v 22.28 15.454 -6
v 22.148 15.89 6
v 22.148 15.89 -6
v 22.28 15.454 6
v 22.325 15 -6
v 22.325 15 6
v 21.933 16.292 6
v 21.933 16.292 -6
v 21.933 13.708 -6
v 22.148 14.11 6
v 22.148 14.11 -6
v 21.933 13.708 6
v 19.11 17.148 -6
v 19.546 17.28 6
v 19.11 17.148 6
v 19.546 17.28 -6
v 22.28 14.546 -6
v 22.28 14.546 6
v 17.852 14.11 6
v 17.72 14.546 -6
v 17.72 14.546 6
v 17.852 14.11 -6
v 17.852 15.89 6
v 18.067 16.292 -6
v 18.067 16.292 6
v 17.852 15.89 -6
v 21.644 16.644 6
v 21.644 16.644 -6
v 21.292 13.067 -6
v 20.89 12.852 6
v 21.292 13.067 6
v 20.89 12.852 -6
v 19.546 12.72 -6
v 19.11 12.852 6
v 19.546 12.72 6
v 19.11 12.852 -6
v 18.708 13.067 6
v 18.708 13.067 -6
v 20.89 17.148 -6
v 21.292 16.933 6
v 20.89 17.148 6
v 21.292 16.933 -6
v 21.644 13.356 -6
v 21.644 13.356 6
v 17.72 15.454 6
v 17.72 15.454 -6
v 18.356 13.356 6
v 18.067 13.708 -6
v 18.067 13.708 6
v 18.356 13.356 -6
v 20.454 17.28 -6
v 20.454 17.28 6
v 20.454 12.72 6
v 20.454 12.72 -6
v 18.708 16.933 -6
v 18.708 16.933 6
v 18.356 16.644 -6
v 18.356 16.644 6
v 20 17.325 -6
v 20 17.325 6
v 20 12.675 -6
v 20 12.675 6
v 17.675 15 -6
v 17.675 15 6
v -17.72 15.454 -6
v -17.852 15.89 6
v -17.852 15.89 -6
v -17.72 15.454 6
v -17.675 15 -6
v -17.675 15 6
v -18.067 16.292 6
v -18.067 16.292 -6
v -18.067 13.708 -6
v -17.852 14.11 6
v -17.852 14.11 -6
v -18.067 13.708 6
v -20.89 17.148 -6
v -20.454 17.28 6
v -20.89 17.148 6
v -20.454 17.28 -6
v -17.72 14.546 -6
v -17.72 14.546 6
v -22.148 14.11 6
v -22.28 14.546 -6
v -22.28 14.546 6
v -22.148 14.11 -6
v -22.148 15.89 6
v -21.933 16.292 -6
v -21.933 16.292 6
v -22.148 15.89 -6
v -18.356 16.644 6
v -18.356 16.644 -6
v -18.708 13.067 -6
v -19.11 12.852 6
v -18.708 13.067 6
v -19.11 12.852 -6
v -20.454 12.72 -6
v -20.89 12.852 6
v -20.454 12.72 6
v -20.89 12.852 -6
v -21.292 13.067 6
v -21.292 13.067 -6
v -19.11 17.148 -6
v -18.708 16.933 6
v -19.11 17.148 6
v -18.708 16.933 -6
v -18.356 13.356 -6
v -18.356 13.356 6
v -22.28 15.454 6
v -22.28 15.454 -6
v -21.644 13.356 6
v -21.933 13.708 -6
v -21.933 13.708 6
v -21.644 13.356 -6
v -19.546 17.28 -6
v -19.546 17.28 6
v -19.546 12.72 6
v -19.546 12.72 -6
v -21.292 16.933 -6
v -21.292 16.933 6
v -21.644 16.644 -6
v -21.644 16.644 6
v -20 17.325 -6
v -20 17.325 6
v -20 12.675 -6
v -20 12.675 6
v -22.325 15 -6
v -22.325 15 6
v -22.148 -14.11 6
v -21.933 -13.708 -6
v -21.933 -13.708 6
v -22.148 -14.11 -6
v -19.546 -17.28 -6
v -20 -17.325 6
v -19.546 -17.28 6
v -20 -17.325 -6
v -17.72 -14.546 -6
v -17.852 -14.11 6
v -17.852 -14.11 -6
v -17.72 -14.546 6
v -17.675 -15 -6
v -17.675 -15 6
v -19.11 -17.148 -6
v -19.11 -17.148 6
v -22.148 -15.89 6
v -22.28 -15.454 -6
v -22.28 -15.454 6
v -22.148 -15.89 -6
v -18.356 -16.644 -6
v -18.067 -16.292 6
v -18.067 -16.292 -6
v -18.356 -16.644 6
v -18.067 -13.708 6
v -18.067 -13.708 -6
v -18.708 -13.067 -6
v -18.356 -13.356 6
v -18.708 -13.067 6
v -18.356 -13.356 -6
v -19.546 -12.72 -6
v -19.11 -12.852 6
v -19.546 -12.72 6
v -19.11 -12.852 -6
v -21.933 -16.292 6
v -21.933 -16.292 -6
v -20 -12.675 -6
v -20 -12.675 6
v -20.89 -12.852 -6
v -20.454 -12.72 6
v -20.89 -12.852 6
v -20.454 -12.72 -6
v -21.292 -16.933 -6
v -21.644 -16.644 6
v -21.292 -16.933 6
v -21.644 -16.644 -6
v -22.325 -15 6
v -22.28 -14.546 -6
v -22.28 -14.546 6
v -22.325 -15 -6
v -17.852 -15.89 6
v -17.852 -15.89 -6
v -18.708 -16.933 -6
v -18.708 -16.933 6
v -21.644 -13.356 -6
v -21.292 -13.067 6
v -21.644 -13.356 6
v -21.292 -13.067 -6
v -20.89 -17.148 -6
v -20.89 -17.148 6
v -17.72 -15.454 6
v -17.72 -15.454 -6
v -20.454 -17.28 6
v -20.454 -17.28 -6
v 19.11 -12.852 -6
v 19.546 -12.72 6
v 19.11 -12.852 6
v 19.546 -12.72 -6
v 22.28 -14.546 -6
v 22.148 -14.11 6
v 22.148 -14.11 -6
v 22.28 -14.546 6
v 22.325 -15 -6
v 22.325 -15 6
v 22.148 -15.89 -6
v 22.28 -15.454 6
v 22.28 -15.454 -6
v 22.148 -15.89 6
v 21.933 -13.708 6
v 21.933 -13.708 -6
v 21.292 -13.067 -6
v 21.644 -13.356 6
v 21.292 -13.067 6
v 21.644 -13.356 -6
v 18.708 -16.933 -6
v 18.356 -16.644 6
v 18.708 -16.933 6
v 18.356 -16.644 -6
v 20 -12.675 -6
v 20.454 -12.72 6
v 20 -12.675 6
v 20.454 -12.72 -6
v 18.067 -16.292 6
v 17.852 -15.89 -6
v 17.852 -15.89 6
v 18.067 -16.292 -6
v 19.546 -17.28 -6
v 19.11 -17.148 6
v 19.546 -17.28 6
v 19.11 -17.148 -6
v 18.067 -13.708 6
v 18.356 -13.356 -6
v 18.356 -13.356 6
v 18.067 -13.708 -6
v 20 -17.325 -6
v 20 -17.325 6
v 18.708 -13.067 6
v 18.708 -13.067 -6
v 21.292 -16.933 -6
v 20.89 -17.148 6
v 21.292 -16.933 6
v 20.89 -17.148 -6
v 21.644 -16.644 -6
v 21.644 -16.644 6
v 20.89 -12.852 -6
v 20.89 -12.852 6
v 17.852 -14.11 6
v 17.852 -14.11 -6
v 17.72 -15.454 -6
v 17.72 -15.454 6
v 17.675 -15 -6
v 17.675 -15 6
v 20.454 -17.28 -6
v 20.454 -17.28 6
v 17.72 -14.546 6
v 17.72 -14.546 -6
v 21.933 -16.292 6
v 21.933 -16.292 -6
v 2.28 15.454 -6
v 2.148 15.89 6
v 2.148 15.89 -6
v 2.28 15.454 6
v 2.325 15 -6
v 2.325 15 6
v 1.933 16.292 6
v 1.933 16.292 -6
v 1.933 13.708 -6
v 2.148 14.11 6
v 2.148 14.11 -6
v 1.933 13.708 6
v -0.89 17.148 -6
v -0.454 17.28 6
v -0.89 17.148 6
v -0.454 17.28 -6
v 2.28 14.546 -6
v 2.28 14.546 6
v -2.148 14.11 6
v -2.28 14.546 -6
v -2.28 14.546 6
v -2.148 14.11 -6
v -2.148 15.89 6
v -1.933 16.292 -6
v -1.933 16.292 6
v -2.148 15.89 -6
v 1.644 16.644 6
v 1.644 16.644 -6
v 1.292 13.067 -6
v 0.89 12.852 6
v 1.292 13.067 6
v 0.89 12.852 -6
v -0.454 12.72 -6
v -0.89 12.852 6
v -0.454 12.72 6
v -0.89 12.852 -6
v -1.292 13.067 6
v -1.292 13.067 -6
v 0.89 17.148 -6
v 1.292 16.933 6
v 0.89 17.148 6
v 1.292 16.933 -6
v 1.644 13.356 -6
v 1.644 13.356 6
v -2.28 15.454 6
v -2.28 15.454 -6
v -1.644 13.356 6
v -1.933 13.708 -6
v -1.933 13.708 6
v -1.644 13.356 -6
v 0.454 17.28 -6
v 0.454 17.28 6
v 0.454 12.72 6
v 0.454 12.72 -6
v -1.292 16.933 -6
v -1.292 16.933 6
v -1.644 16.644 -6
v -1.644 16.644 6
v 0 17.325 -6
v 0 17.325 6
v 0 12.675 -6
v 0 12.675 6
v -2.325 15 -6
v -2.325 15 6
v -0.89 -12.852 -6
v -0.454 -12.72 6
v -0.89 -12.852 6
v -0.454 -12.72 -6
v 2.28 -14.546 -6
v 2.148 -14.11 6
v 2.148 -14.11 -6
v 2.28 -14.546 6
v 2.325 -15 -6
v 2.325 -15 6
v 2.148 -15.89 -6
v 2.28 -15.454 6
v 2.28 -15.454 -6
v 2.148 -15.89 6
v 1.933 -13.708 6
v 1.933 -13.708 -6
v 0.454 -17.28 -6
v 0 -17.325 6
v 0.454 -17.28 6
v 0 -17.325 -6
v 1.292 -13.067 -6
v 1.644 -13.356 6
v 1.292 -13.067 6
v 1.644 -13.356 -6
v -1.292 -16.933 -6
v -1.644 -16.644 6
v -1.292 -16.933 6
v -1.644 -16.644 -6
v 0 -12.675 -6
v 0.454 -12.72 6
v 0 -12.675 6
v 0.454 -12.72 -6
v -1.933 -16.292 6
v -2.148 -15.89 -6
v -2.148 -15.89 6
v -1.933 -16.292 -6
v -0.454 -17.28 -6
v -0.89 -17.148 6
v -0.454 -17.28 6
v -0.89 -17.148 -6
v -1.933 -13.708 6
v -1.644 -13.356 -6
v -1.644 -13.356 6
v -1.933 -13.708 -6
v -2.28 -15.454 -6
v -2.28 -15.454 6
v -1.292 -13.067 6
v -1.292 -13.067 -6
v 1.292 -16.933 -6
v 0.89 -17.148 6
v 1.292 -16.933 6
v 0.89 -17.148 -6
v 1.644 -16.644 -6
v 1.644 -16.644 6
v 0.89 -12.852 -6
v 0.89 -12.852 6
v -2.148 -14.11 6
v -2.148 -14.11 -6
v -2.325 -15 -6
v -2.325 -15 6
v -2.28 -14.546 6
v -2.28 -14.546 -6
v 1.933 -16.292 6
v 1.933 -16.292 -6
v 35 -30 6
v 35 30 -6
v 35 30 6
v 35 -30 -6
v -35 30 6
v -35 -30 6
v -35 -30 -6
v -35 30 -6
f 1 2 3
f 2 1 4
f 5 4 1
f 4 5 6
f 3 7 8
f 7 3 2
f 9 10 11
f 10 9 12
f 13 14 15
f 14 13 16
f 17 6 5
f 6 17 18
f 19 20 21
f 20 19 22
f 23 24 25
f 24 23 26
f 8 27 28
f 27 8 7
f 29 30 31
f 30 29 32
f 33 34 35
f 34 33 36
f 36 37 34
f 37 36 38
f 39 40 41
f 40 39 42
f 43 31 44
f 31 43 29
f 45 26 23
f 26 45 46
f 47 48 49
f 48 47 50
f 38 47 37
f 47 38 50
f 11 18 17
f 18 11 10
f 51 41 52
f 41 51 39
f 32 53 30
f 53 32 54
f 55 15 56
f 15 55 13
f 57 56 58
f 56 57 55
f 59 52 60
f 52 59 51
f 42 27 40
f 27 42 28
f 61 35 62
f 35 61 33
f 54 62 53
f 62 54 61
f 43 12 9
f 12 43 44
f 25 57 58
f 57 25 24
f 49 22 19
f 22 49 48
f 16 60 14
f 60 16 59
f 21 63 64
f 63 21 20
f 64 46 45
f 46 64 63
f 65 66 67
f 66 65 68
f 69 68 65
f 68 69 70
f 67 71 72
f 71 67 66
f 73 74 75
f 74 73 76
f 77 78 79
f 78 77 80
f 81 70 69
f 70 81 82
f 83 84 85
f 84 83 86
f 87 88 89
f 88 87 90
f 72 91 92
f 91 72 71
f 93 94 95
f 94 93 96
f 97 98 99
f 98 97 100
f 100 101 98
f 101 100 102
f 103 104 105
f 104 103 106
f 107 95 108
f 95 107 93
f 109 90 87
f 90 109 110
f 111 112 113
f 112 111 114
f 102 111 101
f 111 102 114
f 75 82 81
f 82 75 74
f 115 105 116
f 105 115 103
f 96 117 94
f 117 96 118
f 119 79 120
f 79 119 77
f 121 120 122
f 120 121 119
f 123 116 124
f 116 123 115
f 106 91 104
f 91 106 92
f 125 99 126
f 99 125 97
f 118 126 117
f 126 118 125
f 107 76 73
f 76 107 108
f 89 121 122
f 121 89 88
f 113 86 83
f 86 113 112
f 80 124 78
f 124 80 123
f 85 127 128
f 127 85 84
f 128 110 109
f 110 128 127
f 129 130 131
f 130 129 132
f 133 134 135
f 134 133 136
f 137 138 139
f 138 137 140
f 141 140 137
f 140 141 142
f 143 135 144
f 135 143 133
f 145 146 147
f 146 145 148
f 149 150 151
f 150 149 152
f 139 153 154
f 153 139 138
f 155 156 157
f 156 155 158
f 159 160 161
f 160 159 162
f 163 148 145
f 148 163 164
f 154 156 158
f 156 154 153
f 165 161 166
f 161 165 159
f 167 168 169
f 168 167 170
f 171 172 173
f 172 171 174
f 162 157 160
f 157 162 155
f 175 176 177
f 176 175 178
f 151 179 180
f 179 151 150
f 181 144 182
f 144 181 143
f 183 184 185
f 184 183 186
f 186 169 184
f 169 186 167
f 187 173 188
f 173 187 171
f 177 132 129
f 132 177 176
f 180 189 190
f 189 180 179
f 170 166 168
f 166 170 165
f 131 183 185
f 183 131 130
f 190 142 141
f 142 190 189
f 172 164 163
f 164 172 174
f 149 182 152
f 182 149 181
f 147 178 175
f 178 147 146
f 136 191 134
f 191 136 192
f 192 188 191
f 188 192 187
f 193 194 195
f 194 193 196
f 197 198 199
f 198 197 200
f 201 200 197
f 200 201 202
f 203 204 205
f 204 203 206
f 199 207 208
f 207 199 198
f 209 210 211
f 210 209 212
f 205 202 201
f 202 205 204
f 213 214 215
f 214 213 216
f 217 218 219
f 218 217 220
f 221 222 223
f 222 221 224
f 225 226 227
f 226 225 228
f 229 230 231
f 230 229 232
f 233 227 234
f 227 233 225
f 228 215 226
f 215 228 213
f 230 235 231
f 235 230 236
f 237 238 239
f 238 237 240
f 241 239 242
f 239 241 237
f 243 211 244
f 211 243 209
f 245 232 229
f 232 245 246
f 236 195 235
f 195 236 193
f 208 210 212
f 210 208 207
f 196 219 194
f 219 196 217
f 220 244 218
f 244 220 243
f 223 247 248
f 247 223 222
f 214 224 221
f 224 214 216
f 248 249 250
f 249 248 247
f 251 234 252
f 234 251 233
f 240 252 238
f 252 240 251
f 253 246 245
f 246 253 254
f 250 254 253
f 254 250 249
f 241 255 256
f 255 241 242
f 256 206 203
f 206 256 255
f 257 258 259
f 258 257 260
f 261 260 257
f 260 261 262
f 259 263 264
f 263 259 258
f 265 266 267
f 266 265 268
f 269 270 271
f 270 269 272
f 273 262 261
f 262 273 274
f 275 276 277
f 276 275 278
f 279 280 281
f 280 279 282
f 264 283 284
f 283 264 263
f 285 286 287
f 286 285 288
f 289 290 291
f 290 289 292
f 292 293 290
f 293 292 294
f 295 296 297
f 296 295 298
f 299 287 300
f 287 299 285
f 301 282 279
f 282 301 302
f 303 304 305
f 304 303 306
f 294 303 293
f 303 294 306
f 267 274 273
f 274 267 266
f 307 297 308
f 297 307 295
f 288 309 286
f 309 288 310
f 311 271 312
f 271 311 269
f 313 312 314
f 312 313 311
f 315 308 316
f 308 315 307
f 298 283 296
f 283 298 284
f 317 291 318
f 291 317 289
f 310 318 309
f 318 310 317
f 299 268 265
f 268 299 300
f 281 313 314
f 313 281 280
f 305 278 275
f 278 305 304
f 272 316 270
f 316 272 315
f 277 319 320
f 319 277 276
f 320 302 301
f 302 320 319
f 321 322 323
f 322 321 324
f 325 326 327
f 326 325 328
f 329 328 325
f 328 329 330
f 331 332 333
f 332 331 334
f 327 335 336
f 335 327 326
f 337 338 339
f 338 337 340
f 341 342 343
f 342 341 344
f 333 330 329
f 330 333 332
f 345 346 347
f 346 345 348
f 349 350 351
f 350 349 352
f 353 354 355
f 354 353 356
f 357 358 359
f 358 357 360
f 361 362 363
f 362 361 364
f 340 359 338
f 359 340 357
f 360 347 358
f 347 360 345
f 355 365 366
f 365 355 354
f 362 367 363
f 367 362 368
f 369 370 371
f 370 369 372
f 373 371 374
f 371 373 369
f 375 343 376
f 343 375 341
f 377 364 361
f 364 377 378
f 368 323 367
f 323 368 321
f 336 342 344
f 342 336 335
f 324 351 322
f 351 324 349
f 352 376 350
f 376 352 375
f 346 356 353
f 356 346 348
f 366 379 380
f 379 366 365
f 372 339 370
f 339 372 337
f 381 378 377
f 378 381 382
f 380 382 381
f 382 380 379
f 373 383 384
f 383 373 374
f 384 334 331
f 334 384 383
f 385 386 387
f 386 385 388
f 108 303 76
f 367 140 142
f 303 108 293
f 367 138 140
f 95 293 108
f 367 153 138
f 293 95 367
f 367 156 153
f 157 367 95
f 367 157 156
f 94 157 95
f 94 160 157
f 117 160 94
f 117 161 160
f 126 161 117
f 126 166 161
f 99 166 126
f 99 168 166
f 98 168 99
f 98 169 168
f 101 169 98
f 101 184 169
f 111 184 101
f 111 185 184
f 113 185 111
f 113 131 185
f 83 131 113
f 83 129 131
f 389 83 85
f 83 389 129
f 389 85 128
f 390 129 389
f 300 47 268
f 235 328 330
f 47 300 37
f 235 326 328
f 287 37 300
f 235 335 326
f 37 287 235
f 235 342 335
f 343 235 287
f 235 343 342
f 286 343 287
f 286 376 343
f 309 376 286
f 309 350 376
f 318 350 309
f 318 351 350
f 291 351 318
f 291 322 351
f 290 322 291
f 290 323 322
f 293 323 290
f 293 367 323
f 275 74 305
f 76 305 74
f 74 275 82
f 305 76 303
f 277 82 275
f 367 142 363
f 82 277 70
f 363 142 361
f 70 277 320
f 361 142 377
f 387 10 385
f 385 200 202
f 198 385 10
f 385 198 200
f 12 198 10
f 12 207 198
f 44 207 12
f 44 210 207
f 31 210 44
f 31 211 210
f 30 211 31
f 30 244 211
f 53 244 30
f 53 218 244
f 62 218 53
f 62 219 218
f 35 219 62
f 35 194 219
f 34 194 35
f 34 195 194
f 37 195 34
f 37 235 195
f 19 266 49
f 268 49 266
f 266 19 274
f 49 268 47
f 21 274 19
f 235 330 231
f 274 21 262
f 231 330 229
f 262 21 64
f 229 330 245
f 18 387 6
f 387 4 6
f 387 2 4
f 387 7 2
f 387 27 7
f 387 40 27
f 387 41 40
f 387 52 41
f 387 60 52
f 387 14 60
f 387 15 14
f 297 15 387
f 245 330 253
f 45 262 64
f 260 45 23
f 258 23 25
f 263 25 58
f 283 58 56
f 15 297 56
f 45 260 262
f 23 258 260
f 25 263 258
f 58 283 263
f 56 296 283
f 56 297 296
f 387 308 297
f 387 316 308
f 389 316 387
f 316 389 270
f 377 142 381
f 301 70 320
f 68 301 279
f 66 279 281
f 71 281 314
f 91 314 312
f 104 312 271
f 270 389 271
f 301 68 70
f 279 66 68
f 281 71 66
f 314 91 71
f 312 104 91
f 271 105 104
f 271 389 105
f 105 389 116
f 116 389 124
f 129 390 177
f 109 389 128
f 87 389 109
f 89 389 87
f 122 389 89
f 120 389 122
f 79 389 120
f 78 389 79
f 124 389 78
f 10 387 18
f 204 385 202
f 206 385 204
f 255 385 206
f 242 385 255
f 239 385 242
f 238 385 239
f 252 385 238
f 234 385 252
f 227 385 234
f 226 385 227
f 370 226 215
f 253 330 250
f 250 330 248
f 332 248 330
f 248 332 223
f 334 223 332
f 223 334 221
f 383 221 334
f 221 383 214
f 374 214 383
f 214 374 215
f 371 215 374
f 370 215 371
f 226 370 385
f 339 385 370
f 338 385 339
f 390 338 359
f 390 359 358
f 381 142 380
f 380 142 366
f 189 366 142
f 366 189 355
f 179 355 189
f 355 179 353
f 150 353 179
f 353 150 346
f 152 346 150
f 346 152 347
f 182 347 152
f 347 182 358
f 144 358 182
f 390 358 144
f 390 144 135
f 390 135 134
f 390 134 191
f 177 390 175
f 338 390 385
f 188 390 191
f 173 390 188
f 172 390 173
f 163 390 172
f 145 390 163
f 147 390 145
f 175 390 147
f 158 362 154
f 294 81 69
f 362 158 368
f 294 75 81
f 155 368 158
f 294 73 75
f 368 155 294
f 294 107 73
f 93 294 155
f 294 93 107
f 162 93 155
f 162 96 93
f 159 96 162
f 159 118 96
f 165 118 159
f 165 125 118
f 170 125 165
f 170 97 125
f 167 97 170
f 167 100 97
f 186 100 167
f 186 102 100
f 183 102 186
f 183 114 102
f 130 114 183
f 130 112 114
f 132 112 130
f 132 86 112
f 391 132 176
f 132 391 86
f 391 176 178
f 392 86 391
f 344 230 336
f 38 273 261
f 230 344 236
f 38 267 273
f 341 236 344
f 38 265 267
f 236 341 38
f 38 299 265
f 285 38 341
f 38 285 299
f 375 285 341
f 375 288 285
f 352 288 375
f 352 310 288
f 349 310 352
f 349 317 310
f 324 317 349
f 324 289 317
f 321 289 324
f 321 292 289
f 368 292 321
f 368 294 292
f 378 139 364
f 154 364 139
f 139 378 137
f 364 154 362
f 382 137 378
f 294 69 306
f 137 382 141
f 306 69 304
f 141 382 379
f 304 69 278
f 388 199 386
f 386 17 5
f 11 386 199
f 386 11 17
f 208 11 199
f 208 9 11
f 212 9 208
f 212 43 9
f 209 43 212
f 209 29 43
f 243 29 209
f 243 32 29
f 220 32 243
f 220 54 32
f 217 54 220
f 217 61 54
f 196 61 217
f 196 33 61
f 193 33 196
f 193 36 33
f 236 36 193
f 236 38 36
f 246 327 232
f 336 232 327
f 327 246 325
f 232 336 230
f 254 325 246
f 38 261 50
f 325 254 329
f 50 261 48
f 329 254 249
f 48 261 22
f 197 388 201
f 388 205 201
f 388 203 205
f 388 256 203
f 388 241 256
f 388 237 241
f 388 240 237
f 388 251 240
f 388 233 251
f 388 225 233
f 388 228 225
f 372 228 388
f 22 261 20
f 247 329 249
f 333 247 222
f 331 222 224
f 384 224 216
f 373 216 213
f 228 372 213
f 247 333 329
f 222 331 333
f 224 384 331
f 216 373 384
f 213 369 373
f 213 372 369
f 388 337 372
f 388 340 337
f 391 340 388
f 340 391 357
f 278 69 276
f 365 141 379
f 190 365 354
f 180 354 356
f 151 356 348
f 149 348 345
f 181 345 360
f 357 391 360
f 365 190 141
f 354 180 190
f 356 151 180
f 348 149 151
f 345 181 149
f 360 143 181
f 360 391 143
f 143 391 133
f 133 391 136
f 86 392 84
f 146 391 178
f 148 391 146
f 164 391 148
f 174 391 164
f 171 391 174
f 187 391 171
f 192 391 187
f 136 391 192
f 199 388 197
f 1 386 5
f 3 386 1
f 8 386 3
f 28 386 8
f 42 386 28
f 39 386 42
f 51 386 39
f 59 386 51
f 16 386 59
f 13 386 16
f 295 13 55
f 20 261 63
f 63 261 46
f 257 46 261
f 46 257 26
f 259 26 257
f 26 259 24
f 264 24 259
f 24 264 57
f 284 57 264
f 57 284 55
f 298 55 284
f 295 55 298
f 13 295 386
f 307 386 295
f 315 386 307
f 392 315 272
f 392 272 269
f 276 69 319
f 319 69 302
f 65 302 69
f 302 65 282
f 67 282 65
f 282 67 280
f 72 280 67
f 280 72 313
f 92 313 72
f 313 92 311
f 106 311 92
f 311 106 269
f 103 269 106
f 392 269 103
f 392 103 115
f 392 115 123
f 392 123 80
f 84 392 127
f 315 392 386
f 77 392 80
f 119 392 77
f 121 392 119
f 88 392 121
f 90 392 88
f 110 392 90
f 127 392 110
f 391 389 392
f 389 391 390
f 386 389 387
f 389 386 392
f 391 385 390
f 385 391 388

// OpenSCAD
$fn = 32;

// ----------------------------------------------------------------------
// Corner plate 70 x 60 x 12
// 6 holes, centres taken from the edge offset
// ----------------------------------------------------------------------

// --- parameters (mm) ---
plate = [70, 60, 12];    // overall size (x, y, z)
holes = 6;               // number of holes the drawing asks for
bore_d = 4.5;            // nominal hole diameter from the drawing
print_allowance = 0.15;  // clearance added for printing
edge = 15;               // hole centre offset from the plate edge

// --- derived feature positions (mm) ---
hole_d = bore_d + print_allowance;  // = 4.65   hole diameter as printed
corner_x = plate[0] / 2 - edge;     // = 20   corner hole X
corner_y = plate[1] / 2 - edge;     // = 15   corner hole Y
feature_centers = [
  [corner_x, corner_y],
  [-corner_x, corner_y],
  [-corner_x, -corner_y],
  [corner_x, -corner_y],
  [0, corner_y],
  [0, -corner_y]
];   // hole centres the loop below drills

// plate outline, every hole drilled through with the same cutters
difference() {
  cube(plate, center = true);
  for (centre = feature_centers)
    translate([centre[0], centre[1], 0])
      cylinder(d = hole_d, h = plate[2] + 2, center = true);
}
